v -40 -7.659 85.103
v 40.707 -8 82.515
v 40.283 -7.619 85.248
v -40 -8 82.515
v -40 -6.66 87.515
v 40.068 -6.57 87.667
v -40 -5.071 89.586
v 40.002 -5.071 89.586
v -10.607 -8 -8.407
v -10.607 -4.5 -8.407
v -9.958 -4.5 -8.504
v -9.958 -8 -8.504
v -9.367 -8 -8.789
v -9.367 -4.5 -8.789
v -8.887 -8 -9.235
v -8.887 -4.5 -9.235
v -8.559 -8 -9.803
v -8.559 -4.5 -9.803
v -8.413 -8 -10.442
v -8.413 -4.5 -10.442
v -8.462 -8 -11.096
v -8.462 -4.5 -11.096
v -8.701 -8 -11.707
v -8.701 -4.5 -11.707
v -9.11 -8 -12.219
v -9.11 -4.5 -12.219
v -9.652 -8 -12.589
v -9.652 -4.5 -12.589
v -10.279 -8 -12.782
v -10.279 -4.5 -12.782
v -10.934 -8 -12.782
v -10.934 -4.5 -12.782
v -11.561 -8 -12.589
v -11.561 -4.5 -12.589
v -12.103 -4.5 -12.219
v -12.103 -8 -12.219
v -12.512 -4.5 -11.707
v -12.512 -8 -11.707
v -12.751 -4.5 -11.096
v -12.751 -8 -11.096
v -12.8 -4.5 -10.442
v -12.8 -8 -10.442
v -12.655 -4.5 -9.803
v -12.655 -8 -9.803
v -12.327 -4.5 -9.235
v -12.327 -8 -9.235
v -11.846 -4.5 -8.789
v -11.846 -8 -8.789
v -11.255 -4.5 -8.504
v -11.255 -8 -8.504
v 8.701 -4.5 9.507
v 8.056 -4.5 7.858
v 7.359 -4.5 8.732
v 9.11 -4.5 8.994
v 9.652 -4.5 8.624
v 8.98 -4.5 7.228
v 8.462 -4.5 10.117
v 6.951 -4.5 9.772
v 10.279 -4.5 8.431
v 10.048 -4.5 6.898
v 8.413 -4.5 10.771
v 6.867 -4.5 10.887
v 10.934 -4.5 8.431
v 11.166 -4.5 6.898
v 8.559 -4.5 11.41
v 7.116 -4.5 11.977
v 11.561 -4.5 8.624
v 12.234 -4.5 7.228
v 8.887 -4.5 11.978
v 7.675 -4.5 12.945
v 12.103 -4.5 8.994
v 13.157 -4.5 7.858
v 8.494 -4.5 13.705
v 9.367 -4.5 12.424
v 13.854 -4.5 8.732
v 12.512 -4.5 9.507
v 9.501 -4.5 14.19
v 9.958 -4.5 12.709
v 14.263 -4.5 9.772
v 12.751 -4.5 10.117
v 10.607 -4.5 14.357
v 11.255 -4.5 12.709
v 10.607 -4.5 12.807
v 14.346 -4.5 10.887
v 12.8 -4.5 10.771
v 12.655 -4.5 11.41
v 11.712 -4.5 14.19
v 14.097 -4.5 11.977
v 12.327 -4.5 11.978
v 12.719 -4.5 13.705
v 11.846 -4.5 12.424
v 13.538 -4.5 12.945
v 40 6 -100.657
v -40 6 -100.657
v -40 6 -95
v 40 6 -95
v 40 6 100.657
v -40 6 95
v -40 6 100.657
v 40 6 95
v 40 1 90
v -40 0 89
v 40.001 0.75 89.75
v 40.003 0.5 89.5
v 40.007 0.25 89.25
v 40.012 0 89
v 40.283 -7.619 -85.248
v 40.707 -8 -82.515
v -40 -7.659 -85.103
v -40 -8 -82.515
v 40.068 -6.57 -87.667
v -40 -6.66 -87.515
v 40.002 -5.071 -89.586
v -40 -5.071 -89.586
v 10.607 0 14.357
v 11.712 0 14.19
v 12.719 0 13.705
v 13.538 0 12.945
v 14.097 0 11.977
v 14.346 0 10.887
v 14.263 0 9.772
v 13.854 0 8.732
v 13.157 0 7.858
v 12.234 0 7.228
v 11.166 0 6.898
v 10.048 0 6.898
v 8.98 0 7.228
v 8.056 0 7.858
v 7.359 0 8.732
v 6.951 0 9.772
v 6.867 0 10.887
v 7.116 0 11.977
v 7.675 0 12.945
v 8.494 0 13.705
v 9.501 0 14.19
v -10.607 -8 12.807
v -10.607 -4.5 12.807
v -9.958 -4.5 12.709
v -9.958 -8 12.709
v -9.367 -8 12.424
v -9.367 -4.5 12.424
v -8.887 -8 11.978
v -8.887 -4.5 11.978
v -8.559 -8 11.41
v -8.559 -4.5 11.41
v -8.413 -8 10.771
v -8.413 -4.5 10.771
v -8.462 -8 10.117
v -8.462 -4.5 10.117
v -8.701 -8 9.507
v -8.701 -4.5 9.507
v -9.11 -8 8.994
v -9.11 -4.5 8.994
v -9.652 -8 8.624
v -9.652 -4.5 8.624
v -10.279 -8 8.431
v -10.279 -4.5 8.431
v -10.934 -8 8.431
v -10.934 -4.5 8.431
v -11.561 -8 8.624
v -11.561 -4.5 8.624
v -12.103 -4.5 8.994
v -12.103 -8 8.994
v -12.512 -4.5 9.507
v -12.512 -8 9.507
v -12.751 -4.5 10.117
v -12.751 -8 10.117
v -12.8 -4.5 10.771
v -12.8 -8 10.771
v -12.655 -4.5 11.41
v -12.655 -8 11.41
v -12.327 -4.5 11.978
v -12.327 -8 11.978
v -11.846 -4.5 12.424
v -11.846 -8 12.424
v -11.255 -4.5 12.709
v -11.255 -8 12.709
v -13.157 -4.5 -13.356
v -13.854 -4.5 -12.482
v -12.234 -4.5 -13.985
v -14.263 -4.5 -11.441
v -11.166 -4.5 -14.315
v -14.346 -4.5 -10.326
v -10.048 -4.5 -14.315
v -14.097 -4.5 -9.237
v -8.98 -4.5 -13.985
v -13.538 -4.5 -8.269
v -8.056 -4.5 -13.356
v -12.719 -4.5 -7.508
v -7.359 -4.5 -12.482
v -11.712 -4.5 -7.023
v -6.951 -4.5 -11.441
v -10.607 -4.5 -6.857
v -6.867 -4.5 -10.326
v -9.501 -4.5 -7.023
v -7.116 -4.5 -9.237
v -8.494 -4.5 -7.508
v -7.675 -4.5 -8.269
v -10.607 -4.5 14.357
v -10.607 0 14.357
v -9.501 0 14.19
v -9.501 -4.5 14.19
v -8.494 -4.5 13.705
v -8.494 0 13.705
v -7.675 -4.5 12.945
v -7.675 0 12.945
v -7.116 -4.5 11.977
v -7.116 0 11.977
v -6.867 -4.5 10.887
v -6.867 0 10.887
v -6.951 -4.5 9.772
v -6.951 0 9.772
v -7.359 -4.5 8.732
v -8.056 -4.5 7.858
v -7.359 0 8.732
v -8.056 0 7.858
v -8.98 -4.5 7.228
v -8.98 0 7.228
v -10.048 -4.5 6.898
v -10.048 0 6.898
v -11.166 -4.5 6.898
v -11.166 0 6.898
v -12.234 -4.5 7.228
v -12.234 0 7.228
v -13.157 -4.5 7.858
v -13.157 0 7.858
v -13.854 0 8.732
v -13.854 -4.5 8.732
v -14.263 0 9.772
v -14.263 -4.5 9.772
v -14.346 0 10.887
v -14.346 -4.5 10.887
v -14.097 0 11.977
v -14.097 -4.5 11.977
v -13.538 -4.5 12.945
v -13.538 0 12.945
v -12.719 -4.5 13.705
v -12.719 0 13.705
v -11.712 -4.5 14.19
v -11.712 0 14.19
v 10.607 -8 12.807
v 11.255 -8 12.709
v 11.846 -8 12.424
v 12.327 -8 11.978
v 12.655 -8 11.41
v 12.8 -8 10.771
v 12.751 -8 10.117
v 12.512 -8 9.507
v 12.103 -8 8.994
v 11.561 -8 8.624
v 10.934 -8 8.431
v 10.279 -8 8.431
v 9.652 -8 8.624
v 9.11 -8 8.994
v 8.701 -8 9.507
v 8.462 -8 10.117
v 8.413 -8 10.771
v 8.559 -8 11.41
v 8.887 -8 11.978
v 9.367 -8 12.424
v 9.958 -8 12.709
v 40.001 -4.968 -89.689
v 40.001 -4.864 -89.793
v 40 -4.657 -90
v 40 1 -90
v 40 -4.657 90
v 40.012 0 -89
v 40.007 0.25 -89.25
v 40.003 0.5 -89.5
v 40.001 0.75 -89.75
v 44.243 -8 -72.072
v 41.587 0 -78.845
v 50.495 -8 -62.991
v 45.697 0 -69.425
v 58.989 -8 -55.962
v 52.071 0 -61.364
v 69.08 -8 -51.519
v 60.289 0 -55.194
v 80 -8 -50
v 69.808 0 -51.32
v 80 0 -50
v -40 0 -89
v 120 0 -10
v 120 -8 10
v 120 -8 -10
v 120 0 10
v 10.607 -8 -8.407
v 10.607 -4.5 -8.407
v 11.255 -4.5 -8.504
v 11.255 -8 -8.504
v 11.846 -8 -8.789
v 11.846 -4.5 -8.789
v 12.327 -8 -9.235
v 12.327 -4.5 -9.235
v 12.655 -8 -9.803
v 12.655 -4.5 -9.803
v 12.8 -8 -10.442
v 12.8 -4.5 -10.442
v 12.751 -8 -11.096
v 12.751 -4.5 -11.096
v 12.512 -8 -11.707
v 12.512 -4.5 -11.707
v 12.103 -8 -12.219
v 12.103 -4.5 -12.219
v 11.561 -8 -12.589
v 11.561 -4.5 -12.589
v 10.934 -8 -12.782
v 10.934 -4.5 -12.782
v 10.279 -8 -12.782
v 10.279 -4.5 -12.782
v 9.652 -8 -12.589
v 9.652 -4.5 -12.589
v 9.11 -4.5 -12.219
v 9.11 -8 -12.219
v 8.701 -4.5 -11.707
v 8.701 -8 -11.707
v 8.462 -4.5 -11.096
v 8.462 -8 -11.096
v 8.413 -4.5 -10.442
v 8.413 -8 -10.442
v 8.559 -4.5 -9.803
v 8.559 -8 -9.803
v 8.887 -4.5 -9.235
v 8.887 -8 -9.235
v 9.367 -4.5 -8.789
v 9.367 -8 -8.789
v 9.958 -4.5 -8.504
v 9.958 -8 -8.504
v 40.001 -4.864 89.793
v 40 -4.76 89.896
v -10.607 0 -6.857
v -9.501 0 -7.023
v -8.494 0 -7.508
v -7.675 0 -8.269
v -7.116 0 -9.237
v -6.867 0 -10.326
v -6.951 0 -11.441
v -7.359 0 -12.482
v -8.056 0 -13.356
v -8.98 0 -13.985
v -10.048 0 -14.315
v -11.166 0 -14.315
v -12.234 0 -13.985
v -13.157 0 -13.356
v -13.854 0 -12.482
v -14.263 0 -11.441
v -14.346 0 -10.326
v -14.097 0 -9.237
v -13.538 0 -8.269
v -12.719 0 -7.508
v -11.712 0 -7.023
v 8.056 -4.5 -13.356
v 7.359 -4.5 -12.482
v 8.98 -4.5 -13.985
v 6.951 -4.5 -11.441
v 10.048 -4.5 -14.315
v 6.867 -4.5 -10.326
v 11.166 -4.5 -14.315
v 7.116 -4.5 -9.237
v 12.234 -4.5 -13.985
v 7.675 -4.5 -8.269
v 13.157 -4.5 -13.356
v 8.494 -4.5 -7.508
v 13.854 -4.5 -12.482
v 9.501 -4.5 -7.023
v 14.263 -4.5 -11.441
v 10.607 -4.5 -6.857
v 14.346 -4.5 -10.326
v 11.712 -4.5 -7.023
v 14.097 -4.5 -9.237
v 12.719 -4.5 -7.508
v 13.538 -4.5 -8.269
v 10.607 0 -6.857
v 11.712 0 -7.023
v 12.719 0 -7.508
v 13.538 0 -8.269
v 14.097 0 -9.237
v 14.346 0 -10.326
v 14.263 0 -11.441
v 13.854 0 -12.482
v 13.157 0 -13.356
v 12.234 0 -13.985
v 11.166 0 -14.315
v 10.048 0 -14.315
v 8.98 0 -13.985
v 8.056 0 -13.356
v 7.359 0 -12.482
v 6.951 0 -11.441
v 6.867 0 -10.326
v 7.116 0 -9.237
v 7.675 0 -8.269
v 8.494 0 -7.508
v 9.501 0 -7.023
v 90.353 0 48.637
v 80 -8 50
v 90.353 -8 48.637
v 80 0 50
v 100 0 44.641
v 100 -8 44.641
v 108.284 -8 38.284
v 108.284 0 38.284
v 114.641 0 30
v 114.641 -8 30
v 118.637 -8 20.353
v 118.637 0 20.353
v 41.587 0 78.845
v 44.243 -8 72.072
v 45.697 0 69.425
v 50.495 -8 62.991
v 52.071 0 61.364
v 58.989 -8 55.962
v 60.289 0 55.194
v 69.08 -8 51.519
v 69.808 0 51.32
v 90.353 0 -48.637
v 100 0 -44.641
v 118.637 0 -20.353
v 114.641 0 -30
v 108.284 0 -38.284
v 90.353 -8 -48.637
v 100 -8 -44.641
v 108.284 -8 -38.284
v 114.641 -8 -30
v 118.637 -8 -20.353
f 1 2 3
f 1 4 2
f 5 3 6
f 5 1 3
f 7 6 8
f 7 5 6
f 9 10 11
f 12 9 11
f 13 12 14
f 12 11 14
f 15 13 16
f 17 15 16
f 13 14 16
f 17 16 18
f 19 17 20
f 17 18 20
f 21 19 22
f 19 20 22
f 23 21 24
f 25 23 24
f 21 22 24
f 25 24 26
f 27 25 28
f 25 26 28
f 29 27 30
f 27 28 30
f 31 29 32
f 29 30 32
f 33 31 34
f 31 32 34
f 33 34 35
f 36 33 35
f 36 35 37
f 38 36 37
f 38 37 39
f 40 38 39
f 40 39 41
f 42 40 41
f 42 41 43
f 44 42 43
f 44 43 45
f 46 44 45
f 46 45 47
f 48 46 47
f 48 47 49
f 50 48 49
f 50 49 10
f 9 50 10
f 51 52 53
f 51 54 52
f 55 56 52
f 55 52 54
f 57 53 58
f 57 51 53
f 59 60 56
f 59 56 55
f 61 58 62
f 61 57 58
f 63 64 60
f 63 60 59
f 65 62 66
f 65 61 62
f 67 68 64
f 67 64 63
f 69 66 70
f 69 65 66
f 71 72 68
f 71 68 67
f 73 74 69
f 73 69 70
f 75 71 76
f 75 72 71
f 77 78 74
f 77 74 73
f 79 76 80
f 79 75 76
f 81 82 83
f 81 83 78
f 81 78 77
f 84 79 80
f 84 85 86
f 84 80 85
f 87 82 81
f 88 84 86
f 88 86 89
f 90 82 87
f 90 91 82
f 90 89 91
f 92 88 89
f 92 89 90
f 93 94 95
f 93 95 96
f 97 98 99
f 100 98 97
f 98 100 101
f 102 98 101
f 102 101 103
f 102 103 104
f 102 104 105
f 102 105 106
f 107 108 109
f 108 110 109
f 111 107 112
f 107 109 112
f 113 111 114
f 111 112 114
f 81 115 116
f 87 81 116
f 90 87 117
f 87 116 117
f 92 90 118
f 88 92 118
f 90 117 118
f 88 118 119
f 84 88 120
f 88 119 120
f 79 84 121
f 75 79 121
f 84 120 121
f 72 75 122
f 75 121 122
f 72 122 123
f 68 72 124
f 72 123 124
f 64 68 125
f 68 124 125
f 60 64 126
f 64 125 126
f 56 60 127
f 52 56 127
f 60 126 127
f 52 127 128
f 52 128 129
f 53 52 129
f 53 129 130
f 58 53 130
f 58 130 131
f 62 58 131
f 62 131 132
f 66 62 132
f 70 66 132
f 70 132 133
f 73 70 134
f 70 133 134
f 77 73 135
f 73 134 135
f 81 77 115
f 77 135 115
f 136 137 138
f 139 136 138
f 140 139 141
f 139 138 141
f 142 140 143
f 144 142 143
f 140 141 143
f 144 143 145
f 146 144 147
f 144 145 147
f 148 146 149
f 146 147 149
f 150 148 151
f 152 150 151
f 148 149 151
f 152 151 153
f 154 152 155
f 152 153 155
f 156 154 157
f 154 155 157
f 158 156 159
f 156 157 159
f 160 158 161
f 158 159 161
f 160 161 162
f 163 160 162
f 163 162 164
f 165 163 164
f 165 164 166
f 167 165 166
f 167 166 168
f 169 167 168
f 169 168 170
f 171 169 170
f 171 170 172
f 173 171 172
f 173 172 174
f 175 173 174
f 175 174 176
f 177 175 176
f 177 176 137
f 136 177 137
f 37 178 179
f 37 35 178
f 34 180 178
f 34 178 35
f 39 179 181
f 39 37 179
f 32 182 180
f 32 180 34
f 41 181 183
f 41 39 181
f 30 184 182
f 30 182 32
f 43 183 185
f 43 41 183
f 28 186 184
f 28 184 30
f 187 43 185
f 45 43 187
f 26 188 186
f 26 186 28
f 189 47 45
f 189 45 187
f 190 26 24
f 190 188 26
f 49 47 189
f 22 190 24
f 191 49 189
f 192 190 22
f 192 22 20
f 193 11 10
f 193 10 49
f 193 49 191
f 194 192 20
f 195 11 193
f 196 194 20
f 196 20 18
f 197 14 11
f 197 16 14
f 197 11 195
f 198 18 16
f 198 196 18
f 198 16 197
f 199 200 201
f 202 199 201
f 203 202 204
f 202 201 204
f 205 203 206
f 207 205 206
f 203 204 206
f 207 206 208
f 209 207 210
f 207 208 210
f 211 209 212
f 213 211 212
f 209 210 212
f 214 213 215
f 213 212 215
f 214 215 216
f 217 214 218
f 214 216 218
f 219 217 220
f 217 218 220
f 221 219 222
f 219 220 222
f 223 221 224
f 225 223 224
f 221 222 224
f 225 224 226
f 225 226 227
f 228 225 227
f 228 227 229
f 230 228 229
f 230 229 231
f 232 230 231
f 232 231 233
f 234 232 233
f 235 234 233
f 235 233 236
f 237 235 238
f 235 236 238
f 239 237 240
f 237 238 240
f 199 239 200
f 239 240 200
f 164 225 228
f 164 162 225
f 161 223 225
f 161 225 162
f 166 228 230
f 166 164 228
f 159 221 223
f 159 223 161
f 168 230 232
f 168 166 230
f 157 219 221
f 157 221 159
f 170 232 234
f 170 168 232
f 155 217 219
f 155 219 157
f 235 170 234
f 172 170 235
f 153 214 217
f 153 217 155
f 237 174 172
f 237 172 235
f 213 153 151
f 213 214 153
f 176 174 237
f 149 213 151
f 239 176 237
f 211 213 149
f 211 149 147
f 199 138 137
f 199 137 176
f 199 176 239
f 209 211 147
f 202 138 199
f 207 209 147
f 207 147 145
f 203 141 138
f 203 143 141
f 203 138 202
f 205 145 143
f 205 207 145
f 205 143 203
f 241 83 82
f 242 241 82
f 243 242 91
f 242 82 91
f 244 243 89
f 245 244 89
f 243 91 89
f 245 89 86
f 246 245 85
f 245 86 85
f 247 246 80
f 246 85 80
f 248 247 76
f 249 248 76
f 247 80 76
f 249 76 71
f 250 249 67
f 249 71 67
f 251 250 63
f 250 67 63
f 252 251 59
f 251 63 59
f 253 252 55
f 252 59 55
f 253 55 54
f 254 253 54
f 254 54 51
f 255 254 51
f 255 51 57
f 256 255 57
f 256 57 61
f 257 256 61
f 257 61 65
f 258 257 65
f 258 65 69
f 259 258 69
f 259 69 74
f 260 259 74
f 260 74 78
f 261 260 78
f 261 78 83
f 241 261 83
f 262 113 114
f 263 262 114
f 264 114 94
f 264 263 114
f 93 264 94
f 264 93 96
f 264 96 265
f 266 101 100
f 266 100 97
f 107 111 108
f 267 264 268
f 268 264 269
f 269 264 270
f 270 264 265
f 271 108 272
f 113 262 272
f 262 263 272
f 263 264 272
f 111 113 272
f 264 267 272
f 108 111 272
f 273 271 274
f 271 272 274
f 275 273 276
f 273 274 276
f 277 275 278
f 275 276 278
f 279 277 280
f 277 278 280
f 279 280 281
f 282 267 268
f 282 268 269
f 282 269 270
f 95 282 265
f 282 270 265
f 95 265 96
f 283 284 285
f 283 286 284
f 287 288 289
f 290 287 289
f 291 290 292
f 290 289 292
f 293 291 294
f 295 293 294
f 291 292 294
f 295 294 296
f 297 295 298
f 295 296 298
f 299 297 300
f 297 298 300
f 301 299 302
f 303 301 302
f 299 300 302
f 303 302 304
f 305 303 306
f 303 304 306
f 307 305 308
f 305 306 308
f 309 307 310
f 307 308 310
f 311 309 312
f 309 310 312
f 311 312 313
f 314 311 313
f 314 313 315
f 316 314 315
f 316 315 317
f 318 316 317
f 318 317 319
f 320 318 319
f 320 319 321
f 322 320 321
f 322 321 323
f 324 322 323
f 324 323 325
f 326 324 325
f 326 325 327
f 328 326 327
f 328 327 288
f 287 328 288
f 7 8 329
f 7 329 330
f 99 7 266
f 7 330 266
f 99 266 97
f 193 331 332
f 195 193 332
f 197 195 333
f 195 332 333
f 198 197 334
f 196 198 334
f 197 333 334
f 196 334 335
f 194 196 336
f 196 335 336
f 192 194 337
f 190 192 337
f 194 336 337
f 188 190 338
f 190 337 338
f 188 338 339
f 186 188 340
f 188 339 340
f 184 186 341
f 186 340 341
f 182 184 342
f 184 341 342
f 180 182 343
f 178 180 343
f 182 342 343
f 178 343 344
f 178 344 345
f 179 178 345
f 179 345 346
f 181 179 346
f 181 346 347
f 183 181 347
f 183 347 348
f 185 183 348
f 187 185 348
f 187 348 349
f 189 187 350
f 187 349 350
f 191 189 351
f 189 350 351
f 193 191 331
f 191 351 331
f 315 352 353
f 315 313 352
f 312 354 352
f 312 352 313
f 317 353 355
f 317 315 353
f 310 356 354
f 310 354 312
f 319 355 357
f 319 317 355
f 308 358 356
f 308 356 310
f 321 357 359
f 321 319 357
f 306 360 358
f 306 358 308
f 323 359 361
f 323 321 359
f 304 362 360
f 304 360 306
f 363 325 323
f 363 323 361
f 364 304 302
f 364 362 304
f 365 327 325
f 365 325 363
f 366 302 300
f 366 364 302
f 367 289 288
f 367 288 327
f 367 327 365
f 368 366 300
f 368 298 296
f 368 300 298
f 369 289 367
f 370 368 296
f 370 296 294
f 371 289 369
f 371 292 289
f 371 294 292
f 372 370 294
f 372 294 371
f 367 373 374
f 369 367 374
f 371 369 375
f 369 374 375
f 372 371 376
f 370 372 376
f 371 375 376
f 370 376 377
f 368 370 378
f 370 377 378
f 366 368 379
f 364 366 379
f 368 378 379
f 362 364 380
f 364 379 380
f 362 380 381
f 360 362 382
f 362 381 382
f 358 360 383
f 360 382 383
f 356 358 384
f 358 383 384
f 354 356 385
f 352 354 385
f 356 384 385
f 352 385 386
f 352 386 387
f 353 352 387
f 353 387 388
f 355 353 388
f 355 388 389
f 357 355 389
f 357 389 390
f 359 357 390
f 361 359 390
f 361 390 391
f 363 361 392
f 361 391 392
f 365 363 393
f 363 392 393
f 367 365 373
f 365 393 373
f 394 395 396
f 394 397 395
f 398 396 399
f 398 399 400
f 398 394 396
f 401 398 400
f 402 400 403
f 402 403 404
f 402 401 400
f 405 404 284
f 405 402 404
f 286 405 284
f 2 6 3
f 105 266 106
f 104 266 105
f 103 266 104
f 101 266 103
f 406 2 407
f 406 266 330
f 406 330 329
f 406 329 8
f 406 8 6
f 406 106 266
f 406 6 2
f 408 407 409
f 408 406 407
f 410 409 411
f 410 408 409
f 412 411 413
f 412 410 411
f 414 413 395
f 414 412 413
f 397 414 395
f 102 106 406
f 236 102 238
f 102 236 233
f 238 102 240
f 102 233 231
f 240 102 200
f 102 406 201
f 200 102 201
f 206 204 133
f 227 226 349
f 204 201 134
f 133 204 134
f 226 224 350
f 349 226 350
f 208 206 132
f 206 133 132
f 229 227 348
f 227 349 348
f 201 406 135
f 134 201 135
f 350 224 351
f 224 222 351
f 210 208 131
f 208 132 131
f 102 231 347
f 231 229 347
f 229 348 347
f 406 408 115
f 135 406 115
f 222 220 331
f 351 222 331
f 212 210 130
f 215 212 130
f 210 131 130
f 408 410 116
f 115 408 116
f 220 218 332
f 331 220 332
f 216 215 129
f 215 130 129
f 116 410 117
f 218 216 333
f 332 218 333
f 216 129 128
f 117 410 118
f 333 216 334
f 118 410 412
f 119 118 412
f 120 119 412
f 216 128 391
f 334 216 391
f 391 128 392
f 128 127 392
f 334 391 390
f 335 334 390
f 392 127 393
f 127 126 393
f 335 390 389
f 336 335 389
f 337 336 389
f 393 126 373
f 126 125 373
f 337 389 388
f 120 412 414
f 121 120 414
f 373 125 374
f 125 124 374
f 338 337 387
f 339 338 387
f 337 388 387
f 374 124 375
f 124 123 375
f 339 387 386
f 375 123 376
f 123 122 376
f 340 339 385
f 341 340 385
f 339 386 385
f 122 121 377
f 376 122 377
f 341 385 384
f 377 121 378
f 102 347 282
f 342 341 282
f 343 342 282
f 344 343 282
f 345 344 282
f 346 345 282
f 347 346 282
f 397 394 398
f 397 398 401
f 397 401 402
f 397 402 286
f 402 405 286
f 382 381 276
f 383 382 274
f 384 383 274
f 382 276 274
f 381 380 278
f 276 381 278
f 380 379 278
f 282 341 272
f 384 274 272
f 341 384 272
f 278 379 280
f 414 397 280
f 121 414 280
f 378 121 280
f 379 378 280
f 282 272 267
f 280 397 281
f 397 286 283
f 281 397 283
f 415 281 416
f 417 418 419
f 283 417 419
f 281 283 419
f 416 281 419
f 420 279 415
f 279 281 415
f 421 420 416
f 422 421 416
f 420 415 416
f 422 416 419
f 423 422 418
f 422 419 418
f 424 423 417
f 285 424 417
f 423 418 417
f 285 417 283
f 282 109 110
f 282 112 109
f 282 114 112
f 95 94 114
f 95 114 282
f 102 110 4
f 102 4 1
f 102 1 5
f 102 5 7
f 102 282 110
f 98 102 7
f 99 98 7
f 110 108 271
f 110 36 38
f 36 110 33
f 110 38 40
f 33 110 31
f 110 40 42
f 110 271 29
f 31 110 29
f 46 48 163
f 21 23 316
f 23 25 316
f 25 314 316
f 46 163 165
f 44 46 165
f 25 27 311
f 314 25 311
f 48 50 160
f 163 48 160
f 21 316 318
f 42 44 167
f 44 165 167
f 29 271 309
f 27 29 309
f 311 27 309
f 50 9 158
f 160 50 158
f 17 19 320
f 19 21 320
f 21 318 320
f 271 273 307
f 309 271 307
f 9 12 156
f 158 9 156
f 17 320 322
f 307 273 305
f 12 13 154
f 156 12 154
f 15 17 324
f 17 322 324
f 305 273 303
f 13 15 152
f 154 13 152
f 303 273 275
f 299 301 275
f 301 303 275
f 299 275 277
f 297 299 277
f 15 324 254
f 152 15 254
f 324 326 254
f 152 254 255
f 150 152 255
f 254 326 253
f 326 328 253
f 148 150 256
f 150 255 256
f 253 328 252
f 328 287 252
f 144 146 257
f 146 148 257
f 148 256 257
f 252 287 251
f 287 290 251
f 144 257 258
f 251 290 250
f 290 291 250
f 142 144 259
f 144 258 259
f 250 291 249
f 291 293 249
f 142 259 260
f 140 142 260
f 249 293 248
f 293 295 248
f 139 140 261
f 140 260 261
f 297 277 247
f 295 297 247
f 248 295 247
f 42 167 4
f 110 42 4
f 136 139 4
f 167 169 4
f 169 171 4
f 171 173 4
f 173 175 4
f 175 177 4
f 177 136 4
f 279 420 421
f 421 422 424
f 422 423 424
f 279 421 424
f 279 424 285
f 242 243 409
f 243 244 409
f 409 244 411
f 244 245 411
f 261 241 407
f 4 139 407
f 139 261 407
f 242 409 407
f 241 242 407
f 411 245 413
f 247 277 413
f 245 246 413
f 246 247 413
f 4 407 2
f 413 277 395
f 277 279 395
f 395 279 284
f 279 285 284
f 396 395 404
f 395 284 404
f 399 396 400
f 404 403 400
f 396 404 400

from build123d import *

# Parameters (mm, degrees)
MAIN_DEPTH          = 40
SKETCH11_W          = 100
SKETCH11_H          = 8
BOSS_EXTRUDE1_DEPTH = 80
FILLET1_R           = 40
SKETCH12_R          = 2.2
CUT_EXTRUDE1_DEPTH  = 162.365552125
SKETCH13_R          = 3.75
CUT_EXTRUDE2_DEPTH  = 4.5
CUT_EXTRUDE3_START  = 13
SKETCH14_W          = 80
SKETCH14_H          = 214.313708498
CUT_EXTRUDE3_DEPTH  = 7
CUT_EXTRUDE4_START  = 1
CUT_EXTRUDE4_DEPTH  = 135.291427387
FILLET2_R           = 10


with BuildPart() as part:
    # Sketch2 → Main (new, symmetric)
    with BuildSketch(Plane(origin=(0, 0, 0), x_dir=(0, 0, -1), z_dir=(1, 0, 0))):
        Polygon((-89, 0), (89, 0), (101.5, 12.5), (107.156854249, 6.843145751), (92.313708499, -8), (-92.313708499, -8), (-107.156854249, 6.843145751), (-101.5, 12.5), align=None)
    extrude(amount=MAIN_DEPTH, both=True)

    # Sketch11 → Boss-Extrude1 (add)
    with BuildSketch(Plane(origin=(40, 0, 0), x_dir=(0, 0, -1), z_dir=(1, 0, 0))):
        with Locations((0, -4)):
            Rectangle(SKETCH11_W, SKETCH11_H)
    extrude(amount=BOSS_EXTRUDE1_DEPTH)

    # Fillet1
    fillet1_edges = [part.edges().sort_by_distance(p)[0] for p in [
        (120, -4, -50),
        (40, -4, -50),
        (40, -4, 50),
        (120, -4, 50),
    ]]
    fillet(fillet1_edges, radius=FILLET1_R - 0.0001)  # a hair under: the kernel refuses the full size

    # Sketch12 → Cut-Extrude1 (cut, through all)
    with BuildSketch(Plane(origin=(0, 0, 0), x_dir=(1, 0, 0), z_dir=(0, 1, 0))):
        with Locations(Location((-10.606601718, 10.606601718, 0), (0, 0, 270))):
            Circle(SKETCH12_R)
        with Locations(Location((10.606601718, 10.606601718, 0), (0, 0, 270))):
            Circle(SKETCH12_R)
        with Locations(Location((10.606601718, -10.606601718, 0), (0, 0, 270))):
            Circle(SKETCH12_R)
        with Locations(Location((-10.606601718, -10.606601718, 0), (0, 0, 270))):
            Circle(SKETCH12_R)
    extrude(amount=-CUT_EXTRUDE1_DEPTH, mode=Mode.SUBTRACT)

    # Sketch13 → Cut-Extrude2 (cut)
    with BuildSketch(Plane(origin=(0, 0, 0), x_dir=(1, 0, 0), z_dir=(0, 1, 0))):
        with Locations(Location((-10.606601718, 10.606601718, 0), (0, 0, 270))):
            Circle(SKETCH13_R)
        with Locations(Location((10.606601718, 10.606601718, 0), (0, 0, 270))):
            Circle(SKETCH13_R)
        with Locations(Location((10.606601718, -10.606601718, 0), (0, 0, 270))):
            Circle(SKETCH13_R)
        with Locations(Location((-10.606601718, -10.606601718, 0), (0, 0, 270))):
            Circle(SKETCH13_R)
    extrude(amount=-CUT_EXTRUDE2_DEPTH, mode=Mode.SUBTRACT)

    # Sketch14 → Cut-Extrude3 (cut)
    with BuildSketch(Plane(origin=(0, 0, 0), x_dir=(1, 0, 0), z_dir=(0, 1, 0)).offset(CUT_EXTRUDE3_START)):
        Rectangle(SKETCH14_W, SKETCH14_H)
    extrude(amount=-CUT_EXTRUDE3_DEPTH, mode=Mode.SUBTRACT)

    # Sketch15 → Cut-Extrude4 (cut, through all)
    with BuildSketch(Plane(origin=(40, 0, 0), x_dir=(0, 0, -1), z_dir=(1, 0, 0)).offset(CUT_EXTRUDE4_START)):
        Polygon((106.313708499, 6), (92.313708499, -8), (86.656854249, -8), (100.656854249, 6), align=None)
    cut_extrude4 = extrude(amount=-CUT_EXTRUDE4_DEPTH, mode=Mode.SUBTRACT)

    # Mirror1: Cut-Extrude4 across plane
    add(cut_extrude4.mirror(Plane.XY), mode=Mode.SUBTRACT)

    # Fillet2
    fillet2_edges = [part.edges().sort_by_distance(p)[0] for p in [
        (0.069972296, -8, 86.656854249),
        (0.069972296, -8, -86.656854249),
    ]]
    fillet(fillet2_edges, radius=FILLET2_R)


solid = part.part
